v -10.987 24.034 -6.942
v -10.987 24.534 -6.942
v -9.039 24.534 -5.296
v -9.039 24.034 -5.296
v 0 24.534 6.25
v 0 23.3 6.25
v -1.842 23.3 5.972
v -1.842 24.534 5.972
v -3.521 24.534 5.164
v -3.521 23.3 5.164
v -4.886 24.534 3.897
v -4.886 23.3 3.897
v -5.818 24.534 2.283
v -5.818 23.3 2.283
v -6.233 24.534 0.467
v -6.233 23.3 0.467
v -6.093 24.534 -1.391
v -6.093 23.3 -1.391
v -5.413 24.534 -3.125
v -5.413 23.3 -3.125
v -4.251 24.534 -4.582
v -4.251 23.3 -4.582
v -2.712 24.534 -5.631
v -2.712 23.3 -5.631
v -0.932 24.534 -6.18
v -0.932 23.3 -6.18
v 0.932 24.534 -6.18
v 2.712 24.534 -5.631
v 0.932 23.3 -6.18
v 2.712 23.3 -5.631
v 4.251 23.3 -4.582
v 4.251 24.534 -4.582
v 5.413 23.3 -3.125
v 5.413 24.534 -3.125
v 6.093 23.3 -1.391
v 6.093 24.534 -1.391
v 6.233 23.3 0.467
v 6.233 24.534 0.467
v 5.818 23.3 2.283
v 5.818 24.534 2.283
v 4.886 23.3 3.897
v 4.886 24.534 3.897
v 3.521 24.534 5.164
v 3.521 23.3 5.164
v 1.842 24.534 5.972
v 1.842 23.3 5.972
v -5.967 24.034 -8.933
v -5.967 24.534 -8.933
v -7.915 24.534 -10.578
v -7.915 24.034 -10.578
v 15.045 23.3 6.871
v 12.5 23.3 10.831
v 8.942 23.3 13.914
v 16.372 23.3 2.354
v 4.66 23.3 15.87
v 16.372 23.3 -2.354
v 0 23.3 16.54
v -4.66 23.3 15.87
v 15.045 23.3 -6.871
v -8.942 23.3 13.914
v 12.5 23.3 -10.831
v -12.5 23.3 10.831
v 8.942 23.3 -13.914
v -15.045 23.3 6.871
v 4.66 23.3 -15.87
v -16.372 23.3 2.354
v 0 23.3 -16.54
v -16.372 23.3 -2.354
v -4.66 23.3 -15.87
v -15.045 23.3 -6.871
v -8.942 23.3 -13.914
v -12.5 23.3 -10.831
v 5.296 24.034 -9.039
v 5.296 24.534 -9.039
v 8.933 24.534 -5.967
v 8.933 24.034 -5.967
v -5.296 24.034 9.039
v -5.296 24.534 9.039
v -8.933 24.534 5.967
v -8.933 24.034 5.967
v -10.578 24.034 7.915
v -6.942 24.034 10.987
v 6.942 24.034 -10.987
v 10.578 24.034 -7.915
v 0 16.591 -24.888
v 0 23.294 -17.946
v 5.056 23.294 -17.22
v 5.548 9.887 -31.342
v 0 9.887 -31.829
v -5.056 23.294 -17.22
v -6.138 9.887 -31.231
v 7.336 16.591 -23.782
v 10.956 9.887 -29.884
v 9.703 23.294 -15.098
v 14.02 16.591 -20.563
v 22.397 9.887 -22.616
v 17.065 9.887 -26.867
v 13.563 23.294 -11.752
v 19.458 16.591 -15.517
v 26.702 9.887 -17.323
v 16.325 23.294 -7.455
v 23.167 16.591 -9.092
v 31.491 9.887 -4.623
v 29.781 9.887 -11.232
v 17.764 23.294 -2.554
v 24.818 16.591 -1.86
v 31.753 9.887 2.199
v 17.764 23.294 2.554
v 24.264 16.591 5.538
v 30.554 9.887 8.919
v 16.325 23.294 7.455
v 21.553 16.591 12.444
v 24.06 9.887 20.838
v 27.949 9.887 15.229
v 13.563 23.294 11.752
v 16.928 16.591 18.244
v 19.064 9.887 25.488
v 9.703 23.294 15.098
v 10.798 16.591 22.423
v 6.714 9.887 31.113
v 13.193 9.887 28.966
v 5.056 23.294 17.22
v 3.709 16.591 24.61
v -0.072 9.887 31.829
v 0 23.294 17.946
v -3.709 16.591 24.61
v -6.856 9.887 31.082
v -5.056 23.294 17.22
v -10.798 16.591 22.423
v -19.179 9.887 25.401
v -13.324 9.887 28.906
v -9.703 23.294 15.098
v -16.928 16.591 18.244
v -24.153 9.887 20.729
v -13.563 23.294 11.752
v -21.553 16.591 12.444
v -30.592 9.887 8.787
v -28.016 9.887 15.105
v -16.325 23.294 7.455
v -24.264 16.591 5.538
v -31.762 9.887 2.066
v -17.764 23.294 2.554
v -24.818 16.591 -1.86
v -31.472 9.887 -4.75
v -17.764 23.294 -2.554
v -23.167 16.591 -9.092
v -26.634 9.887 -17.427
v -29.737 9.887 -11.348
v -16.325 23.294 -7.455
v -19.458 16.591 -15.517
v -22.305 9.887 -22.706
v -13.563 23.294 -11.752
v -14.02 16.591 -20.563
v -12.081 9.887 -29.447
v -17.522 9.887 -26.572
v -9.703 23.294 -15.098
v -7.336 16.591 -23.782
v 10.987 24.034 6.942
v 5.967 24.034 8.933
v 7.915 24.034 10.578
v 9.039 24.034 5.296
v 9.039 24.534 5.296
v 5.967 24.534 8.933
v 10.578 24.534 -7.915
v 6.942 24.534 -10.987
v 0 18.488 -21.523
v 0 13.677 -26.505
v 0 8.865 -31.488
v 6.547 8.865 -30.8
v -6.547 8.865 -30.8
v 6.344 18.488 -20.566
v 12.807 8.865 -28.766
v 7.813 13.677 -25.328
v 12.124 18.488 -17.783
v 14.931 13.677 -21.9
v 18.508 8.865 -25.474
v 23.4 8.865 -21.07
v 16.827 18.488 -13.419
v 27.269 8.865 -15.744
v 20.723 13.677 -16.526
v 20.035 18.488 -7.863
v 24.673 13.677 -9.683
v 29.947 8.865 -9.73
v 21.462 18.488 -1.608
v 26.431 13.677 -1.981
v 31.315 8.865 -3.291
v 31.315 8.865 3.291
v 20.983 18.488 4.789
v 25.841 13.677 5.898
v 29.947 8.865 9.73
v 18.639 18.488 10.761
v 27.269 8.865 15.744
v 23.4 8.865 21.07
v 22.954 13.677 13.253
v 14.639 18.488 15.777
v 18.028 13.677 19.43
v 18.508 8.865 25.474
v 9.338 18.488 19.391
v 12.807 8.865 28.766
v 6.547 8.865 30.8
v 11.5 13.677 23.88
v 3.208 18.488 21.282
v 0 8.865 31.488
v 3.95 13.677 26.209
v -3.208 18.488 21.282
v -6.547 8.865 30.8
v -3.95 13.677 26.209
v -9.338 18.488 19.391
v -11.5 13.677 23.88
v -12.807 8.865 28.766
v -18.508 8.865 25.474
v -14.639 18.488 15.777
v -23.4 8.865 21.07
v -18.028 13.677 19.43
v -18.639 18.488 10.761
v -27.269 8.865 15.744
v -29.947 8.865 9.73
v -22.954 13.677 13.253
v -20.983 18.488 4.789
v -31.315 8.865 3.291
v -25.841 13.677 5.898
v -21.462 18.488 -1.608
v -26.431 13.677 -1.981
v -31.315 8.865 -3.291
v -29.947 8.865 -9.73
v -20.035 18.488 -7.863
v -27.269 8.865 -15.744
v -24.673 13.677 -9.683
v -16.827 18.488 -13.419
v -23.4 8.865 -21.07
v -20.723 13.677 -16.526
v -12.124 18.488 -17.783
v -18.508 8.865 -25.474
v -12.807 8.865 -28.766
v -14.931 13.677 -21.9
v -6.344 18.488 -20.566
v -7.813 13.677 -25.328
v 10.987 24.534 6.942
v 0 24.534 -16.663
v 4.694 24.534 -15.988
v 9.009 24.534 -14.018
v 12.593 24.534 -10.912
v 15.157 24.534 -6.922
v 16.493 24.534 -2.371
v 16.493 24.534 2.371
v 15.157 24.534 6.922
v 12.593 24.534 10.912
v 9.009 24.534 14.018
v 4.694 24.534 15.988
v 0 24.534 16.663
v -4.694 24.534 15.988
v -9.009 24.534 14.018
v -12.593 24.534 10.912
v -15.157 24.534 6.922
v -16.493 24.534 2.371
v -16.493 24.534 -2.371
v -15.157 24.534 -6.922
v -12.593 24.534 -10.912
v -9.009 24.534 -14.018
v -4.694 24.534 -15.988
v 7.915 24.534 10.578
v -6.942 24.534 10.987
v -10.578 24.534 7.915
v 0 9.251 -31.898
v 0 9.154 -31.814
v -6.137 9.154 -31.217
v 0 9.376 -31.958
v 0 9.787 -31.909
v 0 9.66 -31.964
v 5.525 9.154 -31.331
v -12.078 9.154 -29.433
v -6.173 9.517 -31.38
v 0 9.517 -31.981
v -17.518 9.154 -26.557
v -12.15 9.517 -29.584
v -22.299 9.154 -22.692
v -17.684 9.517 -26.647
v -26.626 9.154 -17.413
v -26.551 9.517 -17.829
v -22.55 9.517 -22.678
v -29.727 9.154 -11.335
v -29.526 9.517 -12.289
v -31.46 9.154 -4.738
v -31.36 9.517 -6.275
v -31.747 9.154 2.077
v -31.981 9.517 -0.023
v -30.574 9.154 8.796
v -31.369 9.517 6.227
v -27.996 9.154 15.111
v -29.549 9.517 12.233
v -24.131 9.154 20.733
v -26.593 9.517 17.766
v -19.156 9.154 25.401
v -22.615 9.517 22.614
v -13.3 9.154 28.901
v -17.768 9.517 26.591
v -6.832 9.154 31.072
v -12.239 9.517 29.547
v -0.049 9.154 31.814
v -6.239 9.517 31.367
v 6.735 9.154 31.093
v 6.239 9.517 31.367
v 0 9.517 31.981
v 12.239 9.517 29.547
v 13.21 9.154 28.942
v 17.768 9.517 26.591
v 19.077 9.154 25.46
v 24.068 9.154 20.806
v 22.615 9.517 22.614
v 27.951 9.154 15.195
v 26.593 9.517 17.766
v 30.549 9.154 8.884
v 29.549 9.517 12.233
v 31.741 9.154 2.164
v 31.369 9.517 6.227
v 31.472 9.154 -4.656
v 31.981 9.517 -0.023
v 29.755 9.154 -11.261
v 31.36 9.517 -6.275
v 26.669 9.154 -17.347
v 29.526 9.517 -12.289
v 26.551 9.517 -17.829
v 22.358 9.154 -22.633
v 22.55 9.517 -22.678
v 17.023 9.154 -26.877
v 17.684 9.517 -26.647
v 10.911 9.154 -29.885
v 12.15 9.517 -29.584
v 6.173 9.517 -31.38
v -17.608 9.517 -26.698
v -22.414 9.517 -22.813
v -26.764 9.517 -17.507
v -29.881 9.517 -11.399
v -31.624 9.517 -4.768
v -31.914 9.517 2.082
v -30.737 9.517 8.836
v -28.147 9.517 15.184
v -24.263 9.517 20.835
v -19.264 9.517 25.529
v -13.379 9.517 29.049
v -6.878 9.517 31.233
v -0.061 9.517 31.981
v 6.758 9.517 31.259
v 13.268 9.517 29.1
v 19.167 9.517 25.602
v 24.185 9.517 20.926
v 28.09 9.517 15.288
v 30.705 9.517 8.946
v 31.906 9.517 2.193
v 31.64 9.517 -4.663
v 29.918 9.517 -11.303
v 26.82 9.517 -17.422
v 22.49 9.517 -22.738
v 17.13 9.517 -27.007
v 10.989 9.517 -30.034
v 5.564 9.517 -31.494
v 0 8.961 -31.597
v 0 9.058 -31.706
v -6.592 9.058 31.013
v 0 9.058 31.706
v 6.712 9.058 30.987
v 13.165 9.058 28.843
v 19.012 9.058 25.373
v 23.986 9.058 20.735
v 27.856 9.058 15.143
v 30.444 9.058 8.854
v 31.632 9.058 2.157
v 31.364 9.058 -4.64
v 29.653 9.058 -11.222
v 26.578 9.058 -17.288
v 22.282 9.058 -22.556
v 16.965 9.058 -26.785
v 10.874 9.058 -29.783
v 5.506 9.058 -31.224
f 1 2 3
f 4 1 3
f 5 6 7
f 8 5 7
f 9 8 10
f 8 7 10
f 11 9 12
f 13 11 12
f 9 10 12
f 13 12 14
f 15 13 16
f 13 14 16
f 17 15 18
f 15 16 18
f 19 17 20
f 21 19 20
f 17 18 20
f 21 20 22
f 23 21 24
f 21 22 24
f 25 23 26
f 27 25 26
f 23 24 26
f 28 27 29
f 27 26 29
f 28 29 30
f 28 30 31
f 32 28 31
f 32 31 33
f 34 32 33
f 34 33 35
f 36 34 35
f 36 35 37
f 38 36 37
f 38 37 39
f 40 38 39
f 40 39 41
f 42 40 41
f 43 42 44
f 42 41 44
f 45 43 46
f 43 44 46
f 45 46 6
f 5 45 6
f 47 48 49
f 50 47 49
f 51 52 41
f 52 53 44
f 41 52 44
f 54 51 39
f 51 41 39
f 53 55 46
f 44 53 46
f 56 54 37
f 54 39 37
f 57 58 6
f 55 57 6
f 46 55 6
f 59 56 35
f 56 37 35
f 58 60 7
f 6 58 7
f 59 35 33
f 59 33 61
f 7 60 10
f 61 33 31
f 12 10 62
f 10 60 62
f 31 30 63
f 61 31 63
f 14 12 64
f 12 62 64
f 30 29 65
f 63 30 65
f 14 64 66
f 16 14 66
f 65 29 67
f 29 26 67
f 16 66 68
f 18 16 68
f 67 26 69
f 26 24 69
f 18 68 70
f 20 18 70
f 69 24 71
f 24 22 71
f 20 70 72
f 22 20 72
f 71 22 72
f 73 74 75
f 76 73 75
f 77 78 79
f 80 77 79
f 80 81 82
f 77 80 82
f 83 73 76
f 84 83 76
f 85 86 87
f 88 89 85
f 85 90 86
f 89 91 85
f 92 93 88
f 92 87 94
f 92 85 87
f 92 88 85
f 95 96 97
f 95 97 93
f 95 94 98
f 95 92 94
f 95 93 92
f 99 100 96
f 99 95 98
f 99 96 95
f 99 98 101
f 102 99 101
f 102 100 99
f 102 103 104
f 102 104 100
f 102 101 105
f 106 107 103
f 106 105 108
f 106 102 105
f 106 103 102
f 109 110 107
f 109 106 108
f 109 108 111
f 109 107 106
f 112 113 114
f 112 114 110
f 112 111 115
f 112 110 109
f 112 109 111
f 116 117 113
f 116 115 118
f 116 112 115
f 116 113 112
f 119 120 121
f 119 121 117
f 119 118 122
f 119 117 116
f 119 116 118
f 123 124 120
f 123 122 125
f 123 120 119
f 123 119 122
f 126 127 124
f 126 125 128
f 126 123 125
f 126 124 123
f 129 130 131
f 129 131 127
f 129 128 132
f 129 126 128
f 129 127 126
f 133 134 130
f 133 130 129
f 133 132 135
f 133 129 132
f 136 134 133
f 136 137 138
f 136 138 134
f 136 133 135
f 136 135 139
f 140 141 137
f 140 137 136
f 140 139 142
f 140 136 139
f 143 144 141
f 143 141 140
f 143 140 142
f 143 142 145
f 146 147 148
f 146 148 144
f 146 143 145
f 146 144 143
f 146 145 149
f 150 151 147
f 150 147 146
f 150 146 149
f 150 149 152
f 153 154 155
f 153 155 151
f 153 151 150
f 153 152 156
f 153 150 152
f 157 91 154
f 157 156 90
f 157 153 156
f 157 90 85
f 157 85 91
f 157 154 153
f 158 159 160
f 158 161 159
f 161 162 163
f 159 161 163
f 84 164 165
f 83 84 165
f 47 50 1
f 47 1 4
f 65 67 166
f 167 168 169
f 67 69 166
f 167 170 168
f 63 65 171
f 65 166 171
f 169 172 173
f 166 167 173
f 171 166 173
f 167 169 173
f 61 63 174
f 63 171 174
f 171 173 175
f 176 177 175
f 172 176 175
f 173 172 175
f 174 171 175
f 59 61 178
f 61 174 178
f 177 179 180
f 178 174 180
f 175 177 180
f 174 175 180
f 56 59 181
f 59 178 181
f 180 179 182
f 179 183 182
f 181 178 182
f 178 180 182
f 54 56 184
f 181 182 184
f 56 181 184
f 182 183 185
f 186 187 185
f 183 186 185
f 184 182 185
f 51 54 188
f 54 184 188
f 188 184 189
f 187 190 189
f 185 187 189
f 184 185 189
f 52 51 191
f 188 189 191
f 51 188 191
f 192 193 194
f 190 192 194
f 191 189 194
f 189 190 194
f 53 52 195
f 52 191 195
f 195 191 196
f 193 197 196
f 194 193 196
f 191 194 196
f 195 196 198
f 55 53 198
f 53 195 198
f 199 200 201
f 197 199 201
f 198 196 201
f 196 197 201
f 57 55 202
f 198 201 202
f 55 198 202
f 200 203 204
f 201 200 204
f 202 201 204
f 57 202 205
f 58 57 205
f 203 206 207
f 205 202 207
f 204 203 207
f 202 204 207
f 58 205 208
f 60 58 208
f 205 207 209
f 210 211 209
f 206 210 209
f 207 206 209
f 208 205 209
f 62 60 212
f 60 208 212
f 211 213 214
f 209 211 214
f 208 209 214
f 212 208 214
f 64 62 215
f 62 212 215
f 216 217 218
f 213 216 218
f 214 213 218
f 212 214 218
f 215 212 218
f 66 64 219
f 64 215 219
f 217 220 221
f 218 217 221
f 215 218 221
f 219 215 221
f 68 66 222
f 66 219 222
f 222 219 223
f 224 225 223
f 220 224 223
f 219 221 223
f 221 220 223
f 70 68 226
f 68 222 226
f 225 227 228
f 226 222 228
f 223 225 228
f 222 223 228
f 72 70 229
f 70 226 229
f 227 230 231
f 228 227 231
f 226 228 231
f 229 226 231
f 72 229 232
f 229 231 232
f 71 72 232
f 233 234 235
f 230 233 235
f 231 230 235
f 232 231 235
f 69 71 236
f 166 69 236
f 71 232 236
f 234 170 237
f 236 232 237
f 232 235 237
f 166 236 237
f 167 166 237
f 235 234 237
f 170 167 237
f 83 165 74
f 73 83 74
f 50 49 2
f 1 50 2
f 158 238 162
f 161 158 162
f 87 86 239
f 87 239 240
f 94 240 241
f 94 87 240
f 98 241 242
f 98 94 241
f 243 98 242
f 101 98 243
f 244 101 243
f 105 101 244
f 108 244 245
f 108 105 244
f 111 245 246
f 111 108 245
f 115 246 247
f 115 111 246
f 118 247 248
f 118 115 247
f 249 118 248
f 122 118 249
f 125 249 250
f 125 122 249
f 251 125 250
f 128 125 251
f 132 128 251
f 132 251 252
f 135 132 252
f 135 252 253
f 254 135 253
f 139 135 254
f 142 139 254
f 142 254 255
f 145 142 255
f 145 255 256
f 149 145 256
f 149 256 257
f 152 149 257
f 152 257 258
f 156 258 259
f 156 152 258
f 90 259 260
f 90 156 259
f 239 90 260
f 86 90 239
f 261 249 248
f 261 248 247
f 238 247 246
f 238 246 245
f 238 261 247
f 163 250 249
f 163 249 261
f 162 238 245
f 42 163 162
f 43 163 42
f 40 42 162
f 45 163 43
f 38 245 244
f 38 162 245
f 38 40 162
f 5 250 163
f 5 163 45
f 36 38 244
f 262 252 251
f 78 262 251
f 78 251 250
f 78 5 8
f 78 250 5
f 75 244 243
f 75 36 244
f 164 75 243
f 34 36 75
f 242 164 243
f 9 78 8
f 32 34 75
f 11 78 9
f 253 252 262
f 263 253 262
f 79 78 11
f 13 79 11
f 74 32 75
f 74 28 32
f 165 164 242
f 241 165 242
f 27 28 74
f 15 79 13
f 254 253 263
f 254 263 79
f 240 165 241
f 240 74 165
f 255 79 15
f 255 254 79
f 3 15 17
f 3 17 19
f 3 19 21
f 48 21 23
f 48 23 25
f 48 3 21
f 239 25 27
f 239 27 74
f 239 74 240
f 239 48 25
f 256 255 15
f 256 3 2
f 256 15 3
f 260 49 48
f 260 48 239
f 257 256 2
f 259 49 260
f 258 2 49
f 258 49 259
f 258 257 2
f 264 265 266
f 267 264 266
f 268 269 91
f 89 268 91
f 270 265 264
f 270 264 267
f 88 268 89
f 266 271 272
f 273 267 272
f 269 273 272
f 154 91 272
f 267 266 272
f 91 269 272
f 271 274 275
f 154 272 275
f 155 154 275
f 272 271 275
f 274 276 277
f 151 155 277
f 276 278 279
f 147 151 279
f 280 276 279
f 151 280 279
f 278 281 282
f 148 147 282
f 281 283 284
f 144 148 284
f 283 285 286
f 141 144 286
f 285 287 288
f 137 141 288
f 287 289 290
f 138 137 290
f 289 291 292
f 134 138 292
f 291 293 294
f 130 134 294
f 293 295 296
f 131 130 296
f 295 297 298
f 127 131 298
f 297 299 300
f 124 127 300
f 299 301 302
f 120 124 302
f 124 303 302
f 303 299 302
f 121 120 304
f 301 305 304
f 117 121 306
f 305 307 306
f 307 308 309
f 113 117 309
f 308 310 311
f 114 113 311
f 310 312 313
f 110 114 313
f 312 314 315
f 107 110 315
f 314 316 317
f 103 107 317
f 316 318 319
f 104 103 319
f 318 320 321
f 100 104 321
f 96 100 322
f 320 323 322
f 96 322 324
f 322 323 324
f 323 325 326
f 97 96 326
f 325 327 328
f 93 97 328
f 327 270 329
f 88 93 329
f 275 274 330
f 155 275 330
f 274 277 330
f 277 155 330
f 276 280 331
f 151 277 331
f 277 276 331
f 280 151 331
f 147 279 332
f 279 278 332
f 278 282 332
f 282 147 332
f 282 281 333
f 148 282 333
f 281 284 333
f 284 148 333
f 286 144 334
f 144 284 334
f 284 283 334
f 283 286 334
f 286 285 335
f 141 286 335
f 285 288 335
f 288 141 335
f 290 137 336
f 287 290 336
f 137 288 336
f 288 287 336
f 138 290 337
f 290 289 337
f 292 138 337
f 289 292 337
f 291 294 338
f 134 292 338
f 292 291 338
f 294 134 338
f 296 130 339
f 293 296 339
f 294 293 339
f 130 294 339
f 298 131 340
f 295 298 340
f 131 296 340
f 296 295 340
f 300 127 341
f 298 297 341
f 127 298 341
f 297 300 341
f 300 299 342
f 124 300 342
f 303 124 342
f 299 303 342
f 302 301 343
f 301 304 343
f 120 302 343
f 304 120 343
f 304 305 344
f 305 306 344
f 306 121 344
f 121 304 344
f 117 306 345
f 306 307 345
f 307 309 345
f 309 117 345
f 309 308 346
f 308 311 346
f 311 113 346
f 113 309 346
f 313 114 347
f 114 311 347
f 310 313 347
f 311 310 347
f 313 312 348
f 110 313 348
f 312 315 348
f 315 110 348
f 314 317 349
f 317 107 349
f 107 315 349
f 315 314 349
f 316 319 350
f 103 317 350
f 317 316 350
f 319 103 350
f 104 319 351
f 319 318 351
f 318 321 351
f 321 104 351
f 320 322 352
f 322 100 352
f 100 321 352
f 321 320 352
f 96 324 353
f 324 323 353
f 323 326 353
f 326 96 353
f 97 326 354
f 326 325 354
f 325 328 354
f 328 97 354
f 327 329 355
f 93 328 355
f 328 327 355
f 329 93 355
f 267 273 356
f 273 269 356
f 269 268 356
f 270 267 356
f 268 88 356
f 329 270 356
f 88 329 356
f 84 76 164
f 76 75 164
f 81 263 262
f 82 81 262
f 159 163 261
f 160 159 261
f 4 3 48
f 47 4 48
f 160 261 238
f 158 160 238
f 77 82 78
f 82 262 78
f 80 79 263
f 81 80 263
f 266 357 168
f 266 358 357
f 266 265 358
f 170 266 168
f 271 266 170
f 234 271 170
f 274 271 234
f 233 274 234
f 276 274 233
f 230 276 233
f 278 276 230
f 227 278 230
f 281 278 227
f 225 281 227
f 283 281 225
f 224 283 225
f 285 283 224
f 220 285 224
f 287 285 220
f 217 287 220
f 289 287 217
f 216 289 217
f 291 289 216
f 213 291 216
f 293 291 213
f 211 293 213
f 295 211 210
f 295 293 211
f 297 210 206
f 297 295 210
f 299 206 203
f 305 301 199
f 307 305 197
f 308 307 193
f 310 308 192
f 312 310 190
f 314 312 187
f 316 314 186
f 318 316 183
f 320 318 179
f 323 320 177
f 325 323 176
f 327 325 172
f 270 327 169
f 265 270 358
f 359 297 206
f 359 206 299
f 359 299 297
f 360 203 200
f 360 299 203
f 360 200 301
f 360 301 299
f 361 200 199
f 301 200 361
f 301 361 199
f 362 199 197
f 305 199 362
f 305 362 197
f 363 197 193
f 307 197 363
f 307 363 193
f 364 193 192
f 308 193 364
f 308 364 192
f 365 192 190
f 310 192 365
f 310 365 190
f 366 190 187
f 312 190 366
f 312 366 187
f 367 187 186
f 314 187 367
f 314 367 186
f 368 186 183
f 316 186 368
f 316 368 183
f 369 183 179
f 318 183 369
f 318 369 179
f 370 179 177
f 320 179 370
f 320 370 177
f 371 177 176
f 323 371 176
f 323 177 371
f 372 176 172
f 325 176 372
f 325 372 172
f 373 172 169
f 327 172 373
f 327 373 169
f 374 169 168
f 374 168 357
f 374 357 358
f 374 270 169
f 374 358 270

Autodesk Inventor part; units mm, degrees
ref_plane "YZ Plane" through (0, 0, 0) normal (1, 0, 0) x (0, 1, 0)
ref_plane "XZ Plane" through (0, 0, 0) normal (0, 1, 0) x (-1, 0, 0)
ref_plane "XY Plane" through (0, 0, 0) normal (0, 0, 1) x (1, 0, 0)
sketch "Sketch1" plane through (0, 0, 0) normal (1, 0, 0) x (0, 1, 0)
  line L0 (8.865, -31.4879) -> (23.3, -16.54)
  line L1 (23.3, -16.54) -> (23.2885, -19.3531)
  line L2 (10.1754, -32.9308) -> (23.2885, -19.3531)
  arc A0 (8.865, -31.4879) -> (10.1754, -32.9308) centre (54.9627, 9.0608) ccw
  line L3 (9.5145, -32.2145) -> (23.2942, -17.9465)
  line L4 (0, 0) -> (23.3, 0)
  line L5 (0, 0) -> (26.462, 0)
  line L6 (23.3, 0) -> (23.3, -16.54)
  line L7 (23.3, -16.54) -> (15.7759, -24.3314)
  line L8 (23.2885, -19.3531) -> (27.5047, -14.9875)
  line L9 (23.3, 0) -> (24.534, 0)
  line L10 (24.534, 0) -> (24.534, -16.6628)
  line L11 (23.2942, -17.9465) -> (24.534, -16.6628)
  dimension "d0" = 23.3
  dimension "d1" = 16.54
  dimension "d2" = 18.8761
  dimension "d3" = 20.78
  dimension "d4" = 61.3938
  dimension "d5" = 2.8131
  dimension "d6" = 136
  dimension "d17" = 1.9491
  dimension "d18" = 16.6628
  dimension "d19" = 1.928
  dimension "d20" = 4.3656
  dimension "d21" = 7.1565
revolve "Revolution1" add sketch "Sketch1" angle 360 about axis through (0, 0, 0) along (0, 1, 0) contours L0 L1 L3 A0 | L6 L5 L10 L11 L1
sketch "Sketch2" plane through (0, 24.534, 0) normal (0, 1, 0) x (1, 0, 0)
  circle A0 centre (0, 0) radius 6.25
  dimension "d8" = 12.5
hole "Hole1" at (0, 24.534, 0) direction (0, -1, 0) diameter 12.5 depth 2
fillet "Fillet1" radius 0.5 1 edges at (0, 9.5145, 32.2145)
sketch "Sketch5" plane through (0, 24.534, 0) normal (0, 1, 0) x (1, 0, 0)
  line L0 (-5.9666, 8.9326) -> (-7.9148, 10.5784)
  line L1 (-7.9148, 10.5784) -> (-10.9871, 6.9417)
  line L2 (-10.9871, 6.9417) -> (-9.0388, 5.2958)
  line L3 (-9.0388, 5.2958) -> (-5.9666, 8.9326)
  line L4 (-6.9417, -10.9871) -> (-5.2958, -9.0388)
  line L5 (-8.9326, -5.9666) -> (-10.5784, -7.9148)
  line L6 (-10.5784, -7.9148) -> (-6.9417, -10.9871)
  line L7 (-5.2958, -9.0388) -> (-8.9326, -5.9666)
  line L8 (10.9871, -6.9417) -> (9.0388, -5.2958)
  line L9 (5.9666, -8.9326) -> (7.9148, -10.5784)
  line L10 (7.9148, -10.5784) -> (10.9871, -6.9417)
  line L11 (9.0388, -5.2958) -> (5.9666, -8.9326)
  line L12 (6.9417, 10.9871) -> (5.2958, 9.0388)
  line L13 (8.9326, 5.9666) -> (10.5784, 7.9148)
  line L14 (10.5784, 7.9148) -> (6.9417, 10.9871)
  line L15 (5.2958, 9.0388) -> (8.9326, 5.9666)
  point P0 (0, 0)
  point P1 (0, 0)
  point P2 (-10.0129, 6.1188)
  point P3 (-6.1188, -10.0129)
  point P4 (10.0129, -6.1188)
  point P5 (6.1188, 10.0129)
  dimension "d28" = 4.7607
  dimension "d29" = 2.5504
  dimension "d30" = 5.2958
  dimension "d31" = 9.0388
  dimension "d32" = 6.1188
  dimension "d33" = 360
extrude "Extrusion1" cut sketch "Sketch5" against normal blind 0.5
properties part number "Back Cover"
